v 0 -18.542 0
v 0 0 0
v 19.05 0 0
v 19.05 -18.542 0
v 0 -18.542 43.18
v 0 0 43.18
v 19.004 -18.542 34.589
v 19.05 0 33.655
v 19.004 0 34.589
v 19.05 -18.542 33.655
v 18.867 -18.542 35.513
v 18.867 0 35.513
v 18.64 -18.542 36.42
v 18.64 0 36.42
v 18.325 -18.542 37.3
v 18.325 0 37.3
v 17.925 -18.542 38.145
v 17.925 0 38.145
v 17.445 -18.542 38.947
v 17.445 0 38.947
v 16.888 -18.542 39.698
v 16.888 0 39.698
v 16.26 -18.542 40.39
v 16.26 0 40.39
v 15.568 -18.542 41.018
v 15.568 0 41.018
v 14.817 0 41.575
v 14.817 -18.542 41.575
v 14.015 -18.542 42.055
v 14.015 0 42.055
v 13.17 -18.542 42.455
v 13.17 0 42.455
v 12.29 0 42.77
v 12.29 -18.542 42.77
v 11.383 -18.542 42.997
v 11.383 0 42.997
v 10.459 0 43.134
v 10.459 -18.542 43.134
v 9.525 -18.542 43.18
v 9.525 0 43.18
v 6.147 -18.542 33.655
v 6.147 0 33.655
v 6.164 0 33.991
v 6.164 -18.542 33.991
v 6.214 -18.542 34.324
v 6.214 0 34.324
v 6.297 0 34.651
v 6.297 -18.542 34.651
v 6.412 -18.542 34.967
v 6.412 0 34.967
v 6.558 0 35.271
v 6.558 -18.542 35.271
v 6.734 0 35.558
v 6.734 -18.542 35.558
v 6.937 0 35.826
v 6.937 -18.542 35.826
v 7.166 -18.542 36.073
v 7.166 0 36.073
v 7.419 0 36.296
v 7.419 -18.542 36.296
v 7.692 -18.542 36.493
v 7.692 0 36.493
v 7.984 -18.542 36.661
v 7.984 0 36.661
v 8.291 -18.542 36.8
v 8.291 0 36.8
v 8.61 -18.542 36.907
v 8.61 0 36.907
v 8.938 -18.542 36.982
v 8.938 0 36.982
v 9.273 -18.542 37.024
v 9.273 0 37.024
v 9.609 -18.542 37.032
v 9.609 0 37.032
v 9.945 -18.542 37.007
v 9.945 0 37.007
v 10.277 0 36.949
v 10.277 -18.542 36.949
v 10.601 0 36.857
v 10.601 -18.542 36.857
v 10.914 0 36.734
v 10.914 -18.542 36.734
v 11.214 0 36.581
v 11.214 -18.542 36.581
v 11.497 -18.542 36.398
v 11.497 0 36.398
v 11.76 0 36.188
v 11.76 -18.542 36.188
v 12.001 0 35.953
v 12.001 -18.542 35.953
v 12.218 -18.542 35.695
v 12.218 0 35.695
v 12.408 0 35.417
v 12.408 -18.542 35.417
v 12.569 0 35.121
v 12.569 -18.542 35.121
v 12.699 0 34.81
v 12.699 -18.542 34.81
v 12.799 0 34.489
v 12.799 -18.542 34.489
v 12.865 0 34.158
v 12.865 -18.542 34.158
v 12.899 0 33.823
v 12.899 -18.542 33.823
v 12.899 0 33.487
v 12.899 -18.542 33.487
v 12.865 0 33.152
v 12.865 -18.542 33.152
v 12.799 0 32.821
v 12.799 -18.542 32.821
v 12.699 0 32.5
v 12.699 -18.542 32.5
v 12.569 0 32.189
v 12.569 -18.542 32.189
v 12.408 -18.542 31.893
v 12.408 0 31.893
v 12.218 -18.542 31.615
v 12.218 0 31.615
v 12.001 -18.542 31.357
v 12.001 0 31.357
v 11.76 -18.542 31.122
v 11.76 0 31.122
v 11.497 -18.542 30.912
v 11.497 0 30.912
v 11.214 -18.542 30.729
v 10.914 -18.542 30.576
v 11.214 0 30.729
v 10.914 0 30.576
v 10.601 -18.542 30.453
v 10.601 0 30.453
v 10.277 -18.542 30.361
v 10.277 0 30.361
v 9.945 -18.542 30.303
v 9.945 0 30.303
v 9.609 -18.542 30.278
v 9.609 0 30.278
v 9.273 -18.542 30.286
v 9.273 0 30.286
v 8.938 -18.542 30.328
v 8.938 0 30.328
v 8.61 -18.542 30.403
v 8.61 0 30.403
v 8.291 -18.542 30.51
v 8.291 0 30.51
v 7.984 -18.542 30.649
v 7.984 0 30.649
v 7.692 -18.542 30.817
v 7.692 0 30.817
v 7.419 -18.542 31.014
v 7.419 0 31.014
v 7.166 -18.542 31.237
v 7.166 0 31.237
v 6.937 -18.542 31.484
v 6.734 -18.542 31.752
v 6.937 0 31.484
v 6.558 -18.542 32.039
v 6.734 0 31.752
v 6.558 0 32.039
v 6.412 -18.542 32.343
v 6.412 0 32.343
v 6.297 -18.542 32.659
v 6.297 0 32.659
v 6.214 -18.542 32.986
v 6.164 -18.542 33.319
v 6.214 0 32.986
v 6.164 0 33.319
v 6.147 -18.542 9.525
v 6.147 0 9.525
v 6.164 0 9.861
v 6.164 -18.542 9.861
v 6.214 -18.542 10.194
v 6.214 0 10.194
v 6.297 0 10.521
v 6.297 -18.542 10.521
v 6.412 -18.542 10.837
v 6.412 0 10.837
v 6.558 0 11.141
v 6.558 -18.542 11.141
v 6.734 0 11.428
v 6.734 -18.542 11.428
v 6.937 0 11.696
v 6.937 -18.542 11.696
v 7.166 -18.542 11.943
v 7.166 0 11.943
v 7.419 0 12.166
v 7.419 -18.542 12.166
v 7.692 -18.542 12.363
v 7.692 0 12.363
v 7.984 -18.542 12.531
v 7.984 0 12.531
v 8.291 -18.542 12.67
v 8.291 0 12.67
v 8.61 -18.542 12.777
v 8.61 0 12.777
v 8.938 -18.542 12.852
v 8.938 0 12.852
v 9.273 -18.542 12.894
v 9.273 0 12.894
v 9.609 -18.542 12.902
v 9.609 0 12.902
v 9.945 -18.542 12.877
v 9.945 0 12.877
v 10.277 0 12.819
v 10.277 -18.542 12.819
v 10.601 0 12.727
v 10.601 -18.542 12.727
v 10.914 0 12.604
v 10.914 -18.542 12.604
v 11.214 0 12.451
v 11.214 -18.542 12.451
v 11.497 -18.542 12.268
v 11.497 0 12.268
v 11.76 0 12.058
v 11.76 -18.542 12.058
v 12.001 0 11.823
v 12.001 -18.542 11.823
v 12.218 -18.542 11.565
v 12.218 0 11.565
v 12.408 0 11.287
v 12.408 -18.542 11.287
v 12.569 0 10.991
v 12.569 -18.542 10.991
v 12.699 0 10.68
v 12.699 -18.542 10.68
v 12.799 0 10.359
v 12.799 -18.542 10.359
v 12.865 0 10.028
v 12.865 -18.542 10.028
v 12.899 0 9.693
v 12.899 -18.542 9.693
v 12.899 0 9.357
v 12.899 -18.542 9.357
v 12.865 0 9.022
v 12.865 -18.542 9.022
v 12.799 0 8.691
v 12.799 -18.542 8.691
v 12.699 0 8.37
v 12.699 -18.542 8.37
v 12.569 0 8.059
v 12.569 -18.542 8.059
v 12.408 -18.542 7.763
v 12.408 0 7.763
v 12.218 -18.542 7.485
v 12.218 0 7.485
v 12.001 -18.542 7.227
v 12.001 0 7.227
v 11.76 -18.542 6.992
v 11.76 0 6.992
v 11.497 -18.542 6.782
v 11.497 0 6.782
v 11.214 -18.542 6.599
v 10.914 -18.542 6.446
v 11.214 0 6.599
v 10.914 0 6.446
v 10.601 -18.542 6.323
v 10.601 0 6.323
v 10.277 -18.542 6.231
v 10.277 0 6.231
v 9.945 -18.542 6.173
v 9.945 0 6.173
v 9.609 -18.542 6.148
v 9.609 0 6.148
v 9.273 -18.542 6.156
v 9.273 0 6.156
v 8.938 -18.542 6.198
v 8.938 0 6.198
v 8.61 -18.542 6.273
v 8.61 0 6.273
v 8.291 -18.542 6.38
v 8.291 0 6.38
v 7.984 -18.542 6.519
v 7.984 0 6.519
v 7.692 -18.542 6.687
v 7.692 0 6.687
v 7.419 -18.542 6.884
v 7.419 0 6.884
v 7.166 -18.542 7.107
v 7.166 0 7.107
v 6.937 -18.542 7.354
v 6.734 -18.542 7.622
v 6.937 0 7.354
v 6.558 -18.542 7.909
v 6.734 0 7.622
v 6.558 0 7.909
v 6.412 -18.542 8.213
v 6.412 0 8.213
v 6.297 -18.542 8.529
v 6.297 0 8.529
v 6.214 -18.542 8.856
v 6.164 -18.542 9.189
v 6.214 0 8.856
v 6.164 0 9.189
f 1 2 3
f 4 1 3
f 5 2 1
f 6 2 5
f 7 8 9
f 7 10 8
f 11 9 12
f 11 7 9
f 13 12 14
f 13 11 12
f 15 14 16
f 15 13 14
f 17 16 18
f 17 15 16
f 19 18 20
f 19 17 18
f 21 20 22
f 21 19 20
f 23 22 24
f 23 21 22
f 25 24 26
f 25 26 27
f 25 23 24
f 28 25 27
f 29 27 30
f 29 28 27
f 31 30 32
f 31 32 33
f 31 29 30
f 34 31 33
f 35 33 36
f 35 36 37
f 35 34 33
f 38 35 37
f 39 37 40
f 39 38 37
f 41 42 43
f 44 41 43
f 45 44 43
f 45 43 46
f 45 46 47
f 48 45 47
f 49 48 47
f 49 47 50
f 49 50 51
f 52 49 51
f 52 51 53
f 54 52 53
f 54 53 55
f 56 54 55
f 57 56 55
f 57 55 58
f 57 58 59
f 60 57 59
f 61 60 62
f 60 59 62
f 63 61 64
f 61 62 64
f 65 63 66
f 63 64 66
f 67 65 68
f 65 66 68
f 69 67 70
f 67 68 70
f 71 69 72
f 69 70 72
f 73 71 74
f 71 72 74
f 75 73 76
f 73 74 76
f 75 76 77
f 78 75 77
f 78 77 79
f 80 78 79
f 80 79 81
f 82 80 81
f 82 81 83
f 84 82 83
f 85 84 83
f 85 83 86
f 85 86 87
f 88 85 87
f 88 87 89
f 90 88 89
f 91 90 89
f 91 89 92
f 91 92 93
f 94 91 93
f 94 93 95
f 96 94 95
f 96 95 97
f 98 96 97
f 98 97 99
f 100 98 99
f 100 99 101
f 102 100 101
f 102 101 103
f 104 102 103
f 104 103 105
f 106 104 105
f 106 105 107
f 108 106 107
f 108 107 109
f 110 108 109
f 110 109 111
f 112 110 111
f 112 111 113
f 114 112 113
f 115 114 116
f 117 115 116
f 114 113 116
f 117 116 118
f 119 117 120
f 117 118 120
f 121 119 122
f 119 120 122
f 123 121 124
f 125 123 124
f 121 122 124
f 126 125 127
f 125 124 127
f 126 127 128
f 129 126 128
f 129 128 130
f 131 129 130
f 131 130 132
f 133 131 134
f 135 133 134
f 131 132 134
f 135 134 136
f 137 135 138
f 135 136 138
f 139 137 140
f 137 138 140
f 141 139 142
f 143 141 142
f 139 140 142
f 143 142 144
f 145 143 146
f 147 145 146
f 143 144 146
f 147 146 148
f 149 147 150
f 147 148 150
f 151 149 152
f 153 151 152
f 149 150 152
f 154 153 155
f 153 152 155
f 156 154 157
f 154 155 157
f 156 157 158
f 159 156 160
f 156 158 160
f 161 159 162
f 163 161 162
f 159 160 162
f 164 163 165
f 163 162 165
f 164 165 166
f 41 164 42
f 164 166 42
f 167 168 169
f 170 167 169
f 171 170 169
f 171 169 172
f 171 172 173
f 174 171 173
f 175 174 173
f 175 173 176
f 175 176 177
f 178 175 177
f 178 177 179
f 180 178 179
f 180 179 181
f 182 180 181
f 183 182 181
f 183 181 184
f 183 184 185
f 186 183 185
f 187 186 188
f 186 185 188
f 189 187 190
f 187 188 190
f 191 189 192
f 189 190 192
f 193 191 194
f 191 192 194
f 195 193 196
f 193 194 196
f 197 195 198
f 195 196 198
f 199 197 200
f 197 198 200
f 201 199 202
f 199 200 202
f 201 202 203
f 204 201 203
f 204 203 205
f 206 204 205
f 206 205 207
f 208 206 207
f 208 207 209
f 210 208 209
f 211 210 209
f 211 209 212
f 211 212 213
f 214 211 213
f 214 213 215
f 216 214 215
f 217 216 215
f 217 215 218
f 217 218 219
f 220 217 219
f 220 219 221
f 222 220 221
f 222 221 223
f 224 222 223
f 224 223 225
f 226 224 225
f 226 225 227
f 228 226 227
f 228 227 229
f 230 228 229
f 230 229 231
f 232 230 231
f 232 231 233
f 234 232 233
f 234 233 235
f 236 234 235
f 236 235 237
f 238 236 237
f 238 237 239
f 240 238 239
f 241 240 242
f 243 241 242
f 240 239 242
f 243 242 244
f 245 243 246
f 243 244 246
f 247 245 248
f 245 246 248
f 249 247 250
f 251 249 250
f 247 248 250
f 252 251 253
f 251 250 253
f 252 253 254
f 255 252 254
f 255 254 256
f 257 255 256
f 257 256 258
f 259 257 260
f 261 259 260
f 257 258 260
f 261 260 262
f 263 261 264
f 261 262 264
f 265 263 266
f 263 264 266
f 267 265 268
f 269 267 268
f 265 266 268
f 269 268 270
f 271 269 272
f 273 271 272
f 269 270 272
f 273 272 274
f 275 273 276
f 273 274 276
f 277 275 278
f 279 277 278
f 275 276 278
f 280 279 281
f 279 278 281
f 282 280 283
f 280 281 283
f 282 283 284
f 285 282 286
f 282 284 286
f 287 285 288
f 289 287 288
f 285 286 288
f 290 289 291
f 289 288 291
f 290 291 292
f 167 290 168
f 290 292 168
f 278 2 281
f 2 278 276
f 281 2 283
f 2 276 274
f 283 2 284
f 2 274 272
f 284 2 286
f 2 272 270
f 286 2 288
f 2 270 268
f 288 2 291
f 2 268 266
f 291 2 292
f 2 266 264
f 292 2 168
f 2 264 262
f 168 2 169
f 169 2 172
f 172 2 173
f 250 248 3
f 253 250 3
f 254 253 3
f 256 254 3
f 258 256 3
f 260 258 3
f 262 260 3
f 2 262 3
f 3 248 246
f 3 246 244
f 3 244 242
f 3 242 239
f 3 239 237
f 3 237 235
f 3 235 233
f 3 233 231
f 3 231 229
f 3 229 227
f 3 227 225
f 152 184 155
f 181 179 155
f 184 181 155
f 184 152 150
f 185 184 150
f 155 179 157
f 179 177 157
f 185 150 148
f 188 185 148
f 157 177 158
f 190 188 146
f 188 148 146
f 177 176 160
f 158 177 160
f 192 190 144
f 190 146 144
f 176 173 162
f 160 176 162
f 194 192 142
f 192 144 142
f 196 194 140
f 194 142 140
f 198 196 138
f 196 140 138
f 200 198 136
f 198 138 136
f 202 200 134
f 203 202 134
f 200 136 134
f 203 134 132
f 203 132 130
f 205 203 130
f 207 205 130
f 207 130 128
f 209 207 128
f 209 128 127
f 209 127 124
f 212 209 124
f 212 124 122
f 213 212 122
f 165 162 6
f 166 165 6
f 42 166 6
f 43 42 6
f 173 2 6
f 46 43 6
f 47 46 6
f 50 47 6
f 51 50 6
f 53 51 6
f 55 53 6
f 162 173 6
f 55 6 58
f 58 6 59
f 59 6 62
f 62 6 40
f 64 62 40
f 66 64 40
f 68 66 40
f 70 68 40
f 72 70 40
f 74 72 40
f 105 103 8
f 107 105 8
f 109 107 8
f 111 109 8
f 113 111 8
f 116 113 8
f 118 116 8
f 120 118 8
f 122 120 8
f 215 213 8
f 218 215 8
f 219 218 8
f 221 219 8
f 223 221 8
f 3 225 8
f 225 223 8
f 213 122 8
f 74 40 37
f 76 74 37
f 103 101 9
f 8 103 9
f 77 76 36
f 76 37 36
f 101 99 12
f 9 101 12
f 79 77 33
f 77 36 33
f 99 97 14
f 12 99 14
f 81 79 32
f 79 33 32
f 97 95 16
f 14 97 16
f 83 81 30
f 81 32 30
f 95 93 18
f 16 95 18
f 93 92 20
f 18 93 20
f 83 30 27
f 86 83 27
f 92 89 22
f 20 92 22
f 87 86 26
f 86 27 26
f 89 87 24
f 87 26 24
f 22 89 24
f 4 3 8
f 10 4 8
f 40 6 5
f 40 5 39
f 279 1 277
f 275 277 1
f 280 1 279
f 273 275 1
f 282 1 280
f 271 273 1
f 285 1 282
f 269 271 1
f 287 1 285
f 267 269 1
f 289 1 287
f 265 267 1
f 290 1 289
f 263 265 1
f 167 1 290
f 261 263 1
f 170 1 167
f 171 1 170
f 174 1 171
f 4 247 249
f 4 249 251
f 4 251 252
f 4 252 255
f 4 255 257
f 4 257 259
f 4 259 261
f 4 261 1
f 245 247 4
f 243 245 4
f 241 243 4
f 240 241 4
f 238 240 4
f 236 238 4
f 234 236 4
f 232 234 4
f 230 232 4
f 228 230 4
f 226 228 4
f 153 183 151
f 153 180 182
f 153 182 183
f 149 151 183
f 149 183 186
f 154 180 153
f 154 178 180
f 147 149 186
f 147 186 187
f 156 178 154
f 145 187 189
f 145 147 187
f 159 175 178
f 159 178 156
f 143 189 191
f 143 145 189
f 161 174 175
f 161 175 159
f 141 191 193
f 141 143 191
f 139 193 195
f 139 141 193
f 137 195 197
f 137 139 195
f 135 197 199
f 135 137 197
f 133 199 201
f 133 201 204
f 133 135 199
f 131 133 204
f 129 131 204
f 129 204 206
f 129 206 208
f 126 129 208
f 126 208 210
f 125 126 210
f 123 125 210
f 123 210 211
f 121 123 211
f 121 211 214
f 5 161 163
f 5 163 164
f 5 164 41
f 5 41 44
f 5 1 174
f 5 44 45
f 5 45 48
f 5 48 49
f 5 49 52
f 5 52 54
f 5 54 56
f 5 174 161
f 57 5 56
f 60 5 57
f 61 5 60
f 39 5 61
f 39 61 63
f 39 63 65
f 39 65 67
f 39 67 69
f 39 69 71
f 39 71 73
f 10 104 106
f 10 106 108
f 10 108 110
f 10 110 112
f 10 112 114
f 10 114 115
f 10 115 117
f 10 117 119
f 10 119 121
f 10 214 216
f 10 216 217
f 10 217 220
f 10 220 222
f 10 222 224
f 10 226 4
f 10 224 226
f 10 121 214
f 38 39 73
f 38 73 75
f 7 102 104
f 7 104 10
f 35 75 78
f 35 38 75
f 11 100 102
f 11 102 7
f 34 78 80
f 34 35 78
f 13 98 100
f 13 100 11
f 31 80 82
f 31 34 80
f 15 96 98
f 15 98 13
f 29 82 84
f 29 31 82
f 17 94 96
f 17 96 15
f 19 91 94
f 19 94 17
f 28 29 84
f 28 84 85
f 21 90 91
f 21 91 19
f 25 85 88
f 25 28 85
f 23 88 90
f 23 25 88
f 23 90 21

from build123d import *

# Parameters (mm, degrees)
F0_W     = 19.05
F0_H     = 43.18
F1_DEPTH = 18.542
F2_R     = 9.525
F4_D     = 6.7564


with BuildPart() as f1:
    # F0 (on Front) → F1 (new body)
    with BuildSketch(Plane.XZ):
        with Locations((9.525, 21.59)):
            Rectangle(F0_W, F0_H)
    extrude(amount=F1_DEPTH)

    # F2
    f2_edges = [f1.edges().sort_by_distance(p)[0] for p in [
        (19.05, -9.271, 43.18),
    ]]
    fillet(f2_edges, radius=F2_R)

    # F4 (through all)
    with Locations(Plane.XZ.offset(18.542)):
        with Locations((9.525, 33.655), (9.525, 9.525)):
            Hole(F4_D / 2)


solid = f1.part
